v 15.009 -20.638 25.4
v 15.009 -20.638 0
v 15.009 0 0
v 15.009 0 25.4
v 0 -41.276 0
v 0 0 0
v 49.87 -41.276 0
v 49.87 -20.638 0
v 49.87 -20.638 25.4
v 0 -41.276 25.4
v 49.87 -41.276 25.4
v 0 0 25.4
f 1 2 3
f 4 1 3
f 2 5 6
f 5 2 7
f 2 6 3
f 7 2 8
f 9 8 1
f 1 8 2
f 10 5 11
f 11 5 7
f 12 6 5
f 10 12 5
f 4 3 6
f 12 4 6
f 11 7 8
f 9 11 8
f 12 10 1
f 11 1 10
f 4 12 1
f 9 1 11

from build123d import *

# Parameters (mm, degrees)
F1_DEPTH = 25.4


with BuildPart() as f1:
    # F0 (on Top) → F1 (new body)
    with BuildSketch(Plane.XY):
        Polygon((15.0094395503, 0), (0, 0), (0, -41.2759594619), (49.8700737953, -41.2759594619), (49.8700737953, -20.637979731), (15.0094395503, -20.637979731), align=None)
    extrude(amount=F1_DEPTH)

    # F2: sweep along a path in F2_path
    with BuildLine(Plane(origin=(49.8700737953, -41.2759594619, 25.4), x_dir=(0, 0, 1), z_dir=(0, -1, 0))) as f2_path:
        Line((0, 0), (-25.4, 0))
    # F1_face (on face) → F2 (sweep)
    with BuildSketch(Plane(origin=(20.9026501287, -26.1825116321, 25.4), x_dir=(1, 0, 0), z_dir=(0, 0, 1))):
        Polygon((-5.8932105783, 26.1825116321), (-20.9026501287, 26.1825116321), (-20.9026501287, -15.0934478298), (28.9674236666, -15.0934478298), (28.9674236666, 5.5445319012), (-5.8932105783, 5.5445319012), align=None)
    sweep(path=f2_path.line)


solid = f1.part
